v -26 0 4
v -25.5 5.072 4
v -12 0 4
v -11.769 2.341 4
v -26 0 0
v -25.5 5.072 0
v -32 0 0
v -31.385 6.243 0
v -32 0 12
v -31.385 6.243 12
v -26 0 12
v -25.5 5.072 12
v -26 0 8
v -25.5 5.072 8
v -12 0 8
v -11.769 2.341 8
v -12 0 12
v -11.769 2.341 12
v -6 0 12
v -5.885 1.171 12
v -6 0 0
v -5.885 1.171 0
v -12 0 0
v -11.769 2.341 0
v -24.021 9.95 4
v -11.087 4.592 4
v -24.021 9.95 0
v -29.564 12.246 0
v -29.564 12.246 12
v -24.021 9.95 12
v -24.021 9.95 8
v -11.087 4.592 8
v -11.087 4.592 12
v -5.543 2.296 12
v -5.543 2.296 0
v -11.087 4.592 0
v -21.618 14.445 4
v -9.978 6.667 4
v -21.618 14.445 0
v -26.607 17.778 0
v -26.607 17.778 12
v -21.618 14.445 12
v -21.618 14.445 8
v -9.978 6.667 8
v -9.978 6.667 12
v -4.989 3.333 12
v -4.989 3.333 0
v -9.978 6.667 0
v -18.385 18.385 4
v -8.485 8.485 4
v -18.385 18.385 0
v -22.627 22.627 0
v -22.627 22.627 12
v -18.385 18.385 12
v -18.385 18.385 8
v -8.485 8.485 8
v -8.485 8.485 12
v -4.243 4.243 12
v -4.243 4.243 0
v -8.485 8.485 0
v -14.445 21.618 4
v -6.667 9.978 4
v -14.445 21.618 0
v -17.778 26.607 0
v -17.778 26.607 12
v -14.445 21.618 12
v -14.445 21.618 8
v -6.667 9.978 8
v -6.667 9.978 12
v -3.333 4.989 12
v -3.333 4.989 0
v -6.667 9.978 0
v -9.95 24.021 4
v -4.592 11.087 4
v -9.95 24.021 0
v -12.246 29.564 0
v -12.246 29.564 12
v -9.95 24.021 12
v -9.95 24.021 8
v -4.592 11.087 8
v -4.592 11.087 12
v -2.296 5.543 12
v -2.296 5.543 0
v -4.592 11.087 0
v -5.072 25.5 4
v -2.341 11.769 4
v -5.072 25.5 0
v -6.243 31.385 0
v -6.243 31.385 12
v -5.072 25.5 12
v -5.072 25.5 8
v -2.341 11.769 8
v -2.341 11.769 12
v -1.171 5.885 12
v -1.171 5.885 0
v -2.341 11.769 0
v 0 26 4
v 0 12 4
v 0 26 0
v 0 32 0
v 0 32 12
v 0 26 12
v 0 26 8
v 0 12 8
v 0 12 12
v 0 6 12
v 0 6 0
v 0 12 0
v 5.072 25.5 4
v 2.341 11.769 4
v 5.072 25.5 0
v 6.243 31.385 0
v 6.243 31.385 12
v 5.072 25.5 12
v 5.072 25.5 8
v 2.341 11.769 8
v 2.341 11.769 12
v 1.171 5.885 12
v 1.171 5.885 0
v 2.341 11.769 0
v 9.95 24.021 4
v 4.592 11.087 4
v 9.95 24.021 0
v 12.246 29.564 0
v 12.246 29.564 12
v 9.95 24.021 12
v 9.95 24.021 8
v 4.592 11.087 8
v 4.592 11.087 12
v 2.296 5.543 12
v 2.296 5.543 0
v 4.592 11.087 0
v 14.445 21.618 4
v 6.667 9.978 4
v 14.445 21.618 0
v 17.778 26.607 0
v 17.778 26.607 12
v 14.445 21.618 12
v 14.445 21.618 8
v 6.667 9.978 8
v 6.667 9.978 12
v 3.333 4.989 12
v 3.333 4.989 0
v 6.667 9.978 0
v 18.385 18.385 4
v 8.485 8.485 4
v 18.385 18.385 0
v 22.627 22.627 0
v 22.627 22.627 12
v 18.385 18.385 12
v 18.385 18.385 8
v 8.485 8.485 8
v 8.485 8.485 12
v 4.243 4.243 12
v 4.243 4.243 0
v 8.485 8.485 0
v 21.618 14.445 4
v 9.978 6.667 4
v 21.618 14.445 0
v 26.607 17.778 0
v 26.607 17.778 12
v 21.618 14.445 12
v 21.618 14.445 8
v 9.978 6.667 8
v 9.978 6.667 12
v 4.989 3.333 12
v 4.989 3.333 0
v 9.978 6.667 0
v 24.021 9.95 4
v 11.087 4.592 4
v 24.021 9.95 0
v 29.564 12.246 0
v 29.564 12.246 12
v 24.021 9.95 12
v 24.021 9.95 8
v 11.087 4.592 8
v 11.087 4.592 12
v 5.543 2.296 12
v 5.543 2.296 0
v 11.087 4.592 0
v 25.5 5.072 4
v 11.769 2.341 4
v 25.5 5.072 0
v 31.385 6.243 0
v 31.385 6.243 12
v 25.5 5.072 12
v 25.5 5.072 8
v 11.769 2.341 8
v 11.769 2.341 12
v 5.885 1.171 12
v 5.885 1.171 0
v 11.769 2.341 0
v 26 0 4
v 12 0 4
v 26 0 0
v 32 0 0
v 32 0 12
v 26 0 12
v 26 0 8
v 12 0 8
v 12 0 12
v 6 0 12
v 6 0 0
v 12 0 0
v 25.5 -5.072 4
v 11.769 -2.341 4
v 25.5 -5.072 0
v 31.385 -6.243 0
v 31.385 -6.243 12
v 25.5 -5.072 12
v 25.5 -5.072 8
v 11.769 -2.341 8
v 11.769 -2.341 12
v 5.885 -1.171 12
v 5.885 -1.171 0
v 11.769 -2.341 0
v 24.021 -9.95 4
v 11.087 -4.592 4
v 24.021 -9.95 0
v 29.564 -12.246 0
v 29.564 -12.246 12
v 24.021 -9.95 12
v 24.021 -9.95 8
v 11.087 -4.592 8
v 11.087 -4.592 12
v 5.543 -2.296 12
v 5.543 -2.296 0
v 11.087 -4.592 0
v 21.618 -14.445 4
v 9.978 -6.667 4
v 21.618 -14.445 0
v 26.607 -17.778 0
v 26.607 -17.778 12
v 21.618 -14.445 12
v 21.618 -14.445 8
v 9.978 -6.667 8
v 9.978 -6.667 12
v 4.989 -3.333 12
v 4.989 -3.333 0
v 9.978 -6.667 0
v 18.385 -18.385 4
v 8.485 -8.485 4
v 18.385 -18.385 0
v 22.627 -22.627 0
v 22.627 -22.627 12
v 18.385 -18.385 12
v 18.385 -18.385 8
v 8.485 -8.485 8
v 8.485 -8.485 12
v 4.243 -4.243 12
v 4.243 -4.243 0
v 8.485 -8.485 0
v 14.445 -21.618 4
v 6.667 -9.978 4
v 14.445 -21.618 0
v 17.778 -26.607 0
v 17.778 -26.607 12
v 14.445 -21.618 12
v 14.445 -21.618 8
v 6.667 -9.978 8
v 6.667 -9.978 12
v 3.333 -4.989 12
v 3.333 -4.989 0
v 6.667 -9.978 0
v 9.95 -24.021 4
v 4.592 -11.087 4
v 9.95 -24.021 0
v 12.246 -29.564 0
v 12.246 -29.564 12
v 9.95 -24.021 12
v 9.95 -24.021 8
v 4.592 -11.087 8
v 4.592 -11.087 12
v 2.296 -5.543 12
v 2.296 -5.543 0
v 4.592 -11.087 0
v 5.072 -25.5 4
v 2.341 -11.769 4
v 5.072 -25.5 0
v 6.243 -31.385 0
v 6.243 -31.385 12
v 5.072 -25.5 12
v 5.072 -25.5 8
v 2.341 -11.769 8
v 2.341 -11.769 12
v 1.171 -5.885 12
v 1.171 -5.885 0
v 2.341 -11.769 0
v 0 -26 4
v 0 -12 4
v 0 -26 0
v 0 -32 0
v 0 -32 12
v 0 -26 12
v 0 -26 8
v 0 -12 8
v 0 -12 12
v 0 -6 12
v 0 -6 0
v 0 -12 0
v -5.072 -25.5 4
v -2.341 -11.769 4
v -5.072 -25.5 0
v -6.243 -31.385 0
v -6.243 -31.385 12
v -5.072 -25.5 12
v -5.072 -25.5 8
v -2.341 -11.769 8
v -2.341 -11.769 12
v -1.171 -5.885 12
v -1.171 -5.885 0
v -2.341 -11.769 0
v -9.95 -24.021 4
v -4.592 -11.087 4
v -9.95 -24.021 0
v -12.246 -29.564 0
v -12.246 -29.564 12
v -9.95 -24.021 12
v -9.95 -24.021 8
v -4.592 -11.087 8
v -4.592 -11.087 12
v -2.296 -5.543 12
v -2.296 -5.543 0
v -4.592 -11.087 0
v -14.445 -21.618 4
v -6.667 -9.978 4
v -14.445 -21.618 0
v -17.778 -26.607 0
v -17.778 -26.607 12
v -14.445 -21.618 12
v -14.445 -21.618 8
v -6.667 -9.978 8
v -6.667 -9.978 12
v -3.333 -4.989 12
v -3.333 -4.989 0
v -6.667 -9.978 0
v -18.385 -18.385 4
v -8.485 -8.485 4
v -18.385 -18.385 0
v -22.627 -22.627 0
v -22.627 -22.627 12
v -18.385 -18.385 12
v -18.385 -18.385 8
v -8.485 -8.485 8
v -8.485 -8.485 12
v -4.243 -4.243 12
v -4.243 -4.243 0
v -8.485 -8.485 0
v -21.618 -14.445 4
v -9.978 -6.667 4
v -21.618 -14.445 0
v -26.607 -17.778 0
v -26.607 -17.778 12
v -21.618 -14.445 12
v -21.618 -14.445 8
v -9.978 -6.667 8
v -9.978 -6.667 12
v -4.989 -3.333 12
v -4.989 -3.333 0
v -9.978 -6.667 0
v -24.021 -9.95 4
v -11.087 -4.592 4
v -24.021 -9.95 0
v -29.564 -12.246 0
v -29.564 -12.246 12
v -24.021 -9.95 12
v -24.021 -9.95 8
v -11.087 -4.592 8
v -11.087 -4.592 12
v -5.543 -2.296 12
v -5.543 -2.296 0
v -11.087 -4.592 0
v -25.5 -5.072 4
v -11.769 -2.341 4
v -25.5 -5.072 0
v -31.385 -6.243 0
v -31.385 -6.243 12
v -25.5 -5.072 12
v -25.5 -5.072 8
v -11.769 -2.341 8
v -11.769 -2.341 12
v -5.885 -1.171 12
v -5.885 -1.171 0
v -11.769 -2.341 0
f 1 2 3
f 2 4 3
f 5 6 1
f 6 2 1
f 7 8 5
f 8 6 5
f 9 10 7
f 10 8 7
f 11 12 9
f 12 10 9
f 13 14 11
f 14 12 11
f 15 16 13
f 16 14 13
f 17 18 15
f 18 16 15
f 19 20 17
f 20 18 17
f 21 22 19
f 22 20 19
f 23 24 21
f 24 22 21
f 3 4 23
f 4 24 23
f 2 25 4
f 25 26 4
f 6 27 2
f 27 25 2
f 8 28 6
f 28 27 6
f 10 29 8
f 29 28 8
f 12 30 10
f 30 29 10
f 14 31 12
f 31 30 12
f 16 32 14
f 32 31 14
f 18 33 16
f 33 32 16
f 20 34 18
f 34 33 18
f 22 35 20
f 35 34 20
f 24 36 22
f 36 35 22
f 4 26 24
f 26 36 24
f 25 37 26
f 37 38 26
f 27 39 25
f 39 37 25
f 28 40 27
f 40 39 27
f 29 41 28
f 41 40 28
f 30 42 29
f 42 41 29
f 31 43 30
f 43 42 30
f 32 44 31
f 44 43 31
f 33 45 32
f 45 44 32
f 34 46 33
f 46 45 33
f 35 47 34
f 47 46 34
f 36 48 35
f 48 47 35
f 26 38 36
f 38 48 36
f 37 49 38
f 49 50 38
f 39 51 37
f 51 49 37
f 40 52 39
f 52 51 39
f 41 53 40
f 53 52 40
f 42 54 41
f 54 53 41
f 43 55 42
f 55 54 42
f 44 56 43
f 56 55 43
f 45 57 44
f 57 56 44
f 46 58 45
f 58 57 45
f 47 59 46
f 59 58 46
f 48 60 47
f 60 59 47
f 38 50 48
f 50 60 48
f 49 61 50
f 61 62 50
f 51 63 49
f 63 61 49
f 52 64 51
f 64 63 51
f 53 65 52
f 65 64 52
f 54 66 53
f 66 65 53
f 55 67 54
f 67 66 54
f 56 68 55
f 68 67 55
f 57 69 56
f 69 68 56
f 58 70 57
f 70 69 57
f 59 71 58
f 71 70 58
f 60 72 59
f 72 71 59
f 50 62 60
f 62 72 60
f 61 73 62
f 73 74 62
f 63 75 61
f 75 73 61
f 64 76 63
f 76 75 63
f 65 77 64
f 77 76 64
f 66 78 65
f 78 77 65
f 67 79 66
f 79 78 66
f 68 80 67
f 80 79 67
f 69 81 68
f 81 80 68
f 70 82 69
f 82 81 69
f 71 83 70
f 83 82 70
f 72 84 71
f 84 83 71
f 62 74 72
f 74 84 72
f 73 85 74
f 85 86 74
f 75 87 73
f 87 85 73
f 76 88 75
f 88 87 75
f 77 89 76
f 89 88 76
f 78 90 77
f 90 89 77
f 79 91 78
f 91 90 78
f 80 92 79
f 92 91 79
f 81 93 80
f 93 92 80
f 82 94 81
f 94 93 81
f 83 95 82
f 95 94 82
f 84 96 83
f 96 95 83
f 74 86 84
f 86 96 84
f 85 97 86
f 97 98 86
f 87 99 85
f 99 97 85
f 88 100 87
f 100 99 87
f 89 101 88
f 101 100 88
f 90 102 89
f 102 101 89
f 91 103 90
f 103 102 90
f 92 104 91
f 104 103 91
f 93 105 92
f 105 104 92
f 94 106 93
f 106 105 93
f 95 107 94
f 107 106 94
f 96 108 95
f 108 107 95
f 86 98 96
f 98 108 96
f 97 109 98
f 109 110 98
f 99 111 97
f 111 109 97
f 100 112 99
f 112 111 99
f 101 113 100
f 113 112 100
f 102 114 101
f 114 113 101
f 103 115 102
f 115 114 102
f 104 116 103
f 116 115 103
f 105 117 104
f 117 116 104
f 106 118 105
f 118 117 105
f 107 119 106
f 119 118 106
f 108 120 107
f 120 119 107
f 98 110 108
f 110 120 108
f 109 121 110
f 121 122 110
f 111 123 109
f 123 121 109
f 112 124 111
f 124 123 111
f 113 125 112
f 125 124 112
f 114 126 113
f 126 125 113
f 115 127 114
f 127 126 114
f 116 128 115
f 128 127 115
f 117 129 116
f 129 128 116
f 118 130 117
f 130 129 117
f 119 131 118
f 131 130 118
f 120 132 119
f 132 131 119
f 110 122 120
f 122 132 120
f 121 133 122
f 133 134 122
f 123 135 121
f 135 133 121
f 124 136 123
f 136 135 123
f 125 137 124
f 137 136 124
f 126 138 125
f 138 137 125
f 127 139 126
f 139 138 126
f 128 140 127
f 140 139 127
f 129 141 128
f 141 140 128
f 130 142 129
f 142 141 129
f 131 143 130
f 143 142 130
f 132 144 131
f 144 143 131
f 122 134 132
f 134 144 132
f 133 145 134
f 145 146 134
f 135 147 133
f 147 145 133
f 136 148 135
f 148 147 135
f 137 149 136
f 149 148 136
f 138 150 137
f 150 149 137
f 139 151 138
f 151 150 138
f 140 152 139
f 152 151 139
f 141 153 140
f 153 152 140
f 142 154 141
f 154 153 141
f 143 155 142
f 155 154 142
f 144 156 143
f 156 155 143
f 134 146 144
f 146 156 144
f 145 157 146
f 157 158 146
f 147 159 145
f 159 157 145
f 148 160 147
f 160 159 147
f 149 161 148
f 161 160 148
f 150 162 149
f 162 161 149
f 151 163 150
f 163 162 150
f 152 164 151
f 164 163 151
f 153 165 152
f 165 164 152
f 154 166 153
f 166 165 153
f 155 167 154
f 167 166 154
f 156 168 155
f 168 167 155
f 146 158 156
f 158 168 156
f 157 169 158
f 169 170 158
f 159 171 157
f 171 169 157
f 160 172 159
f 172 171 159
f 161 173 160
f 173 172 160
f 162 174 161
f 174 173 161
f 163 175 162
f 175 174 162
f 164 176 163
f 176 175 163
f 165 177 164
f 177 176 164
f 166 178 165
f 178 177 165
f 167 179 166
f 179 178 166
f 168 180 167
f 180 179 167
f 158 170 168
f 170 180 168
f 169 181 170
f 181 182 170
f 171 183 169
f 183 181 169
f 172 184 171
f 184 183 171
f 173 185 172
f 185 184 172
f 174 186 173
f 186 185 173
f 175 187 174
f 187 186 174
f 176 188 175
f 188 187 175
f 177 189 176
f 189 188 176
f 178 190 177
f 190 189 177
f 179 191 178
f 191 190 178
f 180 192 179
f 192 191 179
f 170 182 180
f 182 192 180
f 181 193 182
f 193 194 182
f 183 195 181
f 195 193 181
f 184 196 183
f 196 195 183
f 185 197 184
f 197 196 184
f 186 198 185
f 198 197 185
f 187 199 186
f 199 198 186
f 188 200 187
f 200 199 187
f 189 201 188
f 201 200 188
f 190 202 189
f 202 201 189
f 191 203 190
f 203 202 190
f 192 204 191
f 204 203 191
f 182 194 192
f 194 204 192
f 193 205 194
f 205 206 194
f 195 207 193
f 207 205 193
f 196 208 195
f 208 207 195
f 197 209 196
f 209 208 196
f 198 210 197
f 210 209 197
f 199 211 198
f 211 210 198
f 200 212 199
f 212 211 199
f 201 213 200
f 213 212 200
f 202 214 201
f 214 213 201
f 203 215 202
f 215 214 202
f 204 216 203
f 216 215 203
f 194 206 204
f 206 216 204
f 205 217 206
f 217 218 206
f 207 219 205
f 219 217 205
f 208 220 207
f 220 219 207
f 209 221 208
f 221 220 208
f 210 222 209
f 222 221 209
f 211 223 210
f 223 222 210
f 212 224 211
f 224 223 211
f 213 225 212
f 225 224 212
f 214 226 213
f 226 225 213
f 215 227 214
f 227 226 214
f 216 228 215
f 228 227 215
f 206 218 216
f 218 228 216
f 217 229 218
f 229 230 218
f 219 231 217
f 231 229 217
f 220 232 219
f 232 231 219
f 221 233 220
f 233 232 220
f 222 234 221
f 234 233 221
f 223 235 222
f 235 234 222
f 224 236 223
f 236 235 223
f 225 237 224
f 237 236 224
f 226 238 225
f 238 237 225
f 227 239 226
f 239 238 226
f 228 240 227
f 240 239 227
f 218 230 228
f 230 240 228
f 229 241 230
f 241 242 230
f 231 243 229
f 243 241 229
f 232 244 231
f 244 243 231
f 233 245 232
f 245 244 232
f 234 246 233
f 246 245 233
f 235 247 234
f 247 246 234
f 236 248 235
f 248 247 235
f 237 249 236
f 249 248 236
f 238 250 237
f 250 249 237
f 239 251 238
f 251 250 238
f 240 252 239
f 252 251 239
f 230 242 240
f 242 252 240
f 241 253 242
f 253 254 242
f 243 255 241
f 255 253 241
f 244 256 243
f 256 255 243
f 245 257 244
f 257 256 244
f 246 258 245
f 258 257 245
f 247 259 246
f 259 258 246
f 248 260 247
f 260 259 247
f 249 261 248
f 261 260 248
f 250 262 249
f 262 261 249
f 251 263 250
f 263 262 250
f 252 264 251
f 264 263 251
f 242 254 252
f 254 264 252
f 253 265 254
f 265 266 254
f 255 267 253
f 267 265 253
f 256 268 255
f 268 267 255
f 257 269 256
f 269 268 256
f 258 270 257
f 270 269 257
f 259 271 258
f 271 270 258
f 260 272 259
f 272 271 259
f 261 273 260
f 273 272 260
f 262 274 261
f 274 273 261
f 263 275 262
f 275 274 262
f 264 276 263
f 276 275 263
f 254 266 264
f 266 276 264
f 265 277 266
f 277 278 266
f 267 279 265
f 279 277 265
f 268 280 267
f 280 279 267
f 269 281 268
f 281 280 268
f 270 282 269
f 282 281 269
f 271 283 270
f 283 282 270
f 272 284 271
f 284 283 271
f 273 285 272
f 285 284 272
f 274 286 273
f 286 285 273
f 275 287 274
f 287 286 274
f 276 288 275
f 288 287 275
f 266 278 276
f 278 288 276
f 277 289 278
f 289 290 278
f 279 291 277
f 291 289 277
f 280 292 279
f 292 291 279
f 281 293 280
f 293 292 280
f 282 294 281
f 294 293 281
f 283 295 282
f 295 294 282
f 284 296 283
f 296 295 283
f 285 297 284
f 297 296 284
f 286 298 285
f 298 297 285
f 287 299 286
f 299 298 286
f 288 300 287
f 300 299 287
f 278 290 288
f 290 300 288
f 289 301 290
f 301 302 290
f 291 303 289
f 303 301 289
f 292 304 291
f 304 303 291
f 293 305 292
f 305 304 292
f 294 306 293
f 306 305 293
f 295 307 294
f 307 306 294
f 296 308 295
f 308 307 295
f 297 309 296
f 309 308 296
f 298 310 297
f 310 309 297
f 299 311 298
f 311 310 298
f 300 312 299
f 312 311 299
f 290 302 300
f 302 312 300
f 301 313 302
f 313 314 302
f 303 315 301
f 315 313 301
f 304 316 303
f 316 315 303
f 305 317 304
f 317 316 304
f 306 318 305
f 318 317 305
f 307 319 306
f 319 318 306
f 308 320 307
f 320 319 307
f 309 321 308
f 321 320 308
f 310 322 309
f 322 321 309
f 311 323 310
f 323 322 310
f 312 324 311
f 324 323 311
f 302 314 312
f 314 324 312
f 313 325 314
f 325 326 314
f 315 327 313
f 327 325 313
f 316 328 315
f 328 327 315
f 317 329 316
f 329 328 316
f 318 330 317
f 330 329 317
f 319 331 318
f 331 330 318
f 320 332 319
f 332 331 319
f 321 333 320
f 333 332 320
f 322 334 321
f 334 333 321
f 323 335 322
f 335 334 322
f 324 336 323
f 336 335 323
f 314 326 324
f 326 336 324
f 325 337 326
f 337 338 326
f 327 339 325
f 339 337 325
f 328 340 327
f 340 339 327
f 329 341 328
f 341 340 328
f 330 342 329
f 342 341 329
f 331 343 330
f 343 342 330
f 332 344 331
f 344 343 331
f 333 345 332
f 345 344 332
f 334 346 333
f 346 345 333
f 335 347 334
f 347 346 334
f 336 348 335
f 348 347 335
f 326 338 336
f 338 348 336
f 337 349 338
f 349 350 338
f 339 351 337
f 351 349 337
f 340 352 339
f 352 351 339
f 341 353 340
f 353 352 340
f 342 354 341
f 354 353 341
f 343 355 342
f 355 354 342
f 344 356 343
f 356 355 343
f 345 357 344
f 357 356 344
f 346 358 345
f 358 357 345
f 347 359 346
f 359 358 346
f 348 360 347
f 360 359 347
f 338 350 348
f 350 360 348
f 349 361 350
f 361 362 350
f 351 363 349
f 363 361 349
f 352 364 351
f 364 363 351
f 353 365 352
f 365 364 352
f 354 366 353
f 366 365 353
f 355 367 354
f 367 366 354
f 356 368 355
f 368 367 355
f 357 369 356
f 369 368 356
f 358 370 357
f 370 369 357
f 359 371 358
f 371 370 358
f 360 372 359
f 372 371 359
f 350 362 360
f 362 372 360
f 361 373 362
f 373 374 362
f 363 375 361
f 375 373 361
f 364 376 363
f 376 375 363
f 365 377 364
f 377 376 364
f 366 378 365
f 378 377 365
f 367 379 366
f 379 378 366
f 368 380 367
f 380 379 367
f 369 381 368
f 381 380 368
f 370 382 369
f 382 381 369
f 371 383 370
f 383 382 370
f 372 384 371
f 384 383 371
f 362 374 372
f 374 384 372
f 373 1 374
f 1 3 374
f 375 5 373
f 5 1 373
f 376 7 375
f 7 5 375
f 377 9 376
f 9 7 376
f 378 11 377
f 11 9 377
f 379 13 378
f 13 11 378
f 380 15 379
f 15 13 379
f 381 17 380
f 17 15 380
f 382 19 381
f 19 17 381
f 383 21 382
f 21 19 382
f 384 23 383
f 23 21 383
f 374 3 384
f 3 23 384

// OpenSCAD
$fn = 32;

// ----------------------------------------------------------------------
// Revolved part: handwheel R32
// ----------------------------------------------------------------------

// --- parameters (mm) ---
bore_r = 6;               // bore radius
rim_r = 32;               // rim radius
rim_w = 6;                // rim axial width
rim_t = 12;               // rim diameter height
hub_r = 12;               // hub radius
web_t = 4;                // web thickness
revolve_angle = 360;      // revolve sweep, degrees

bore_d = 2 * bore_r;
rim_d = 2 * rim_r;
hub_d = 2 * hub_r;

profile = [[6, 0], [12, 0], [12, 4], [26, 4], [26, 0], [32, 0], [32, 12], [26, 12], [26, 8], [12, 8], [12, 12], [6, 12]];  // primary outline, 12 points, counter clockwise

// --- the one profile operation ---
rotate_extrude(angle = revolve_angle) polygon(points = profile);
